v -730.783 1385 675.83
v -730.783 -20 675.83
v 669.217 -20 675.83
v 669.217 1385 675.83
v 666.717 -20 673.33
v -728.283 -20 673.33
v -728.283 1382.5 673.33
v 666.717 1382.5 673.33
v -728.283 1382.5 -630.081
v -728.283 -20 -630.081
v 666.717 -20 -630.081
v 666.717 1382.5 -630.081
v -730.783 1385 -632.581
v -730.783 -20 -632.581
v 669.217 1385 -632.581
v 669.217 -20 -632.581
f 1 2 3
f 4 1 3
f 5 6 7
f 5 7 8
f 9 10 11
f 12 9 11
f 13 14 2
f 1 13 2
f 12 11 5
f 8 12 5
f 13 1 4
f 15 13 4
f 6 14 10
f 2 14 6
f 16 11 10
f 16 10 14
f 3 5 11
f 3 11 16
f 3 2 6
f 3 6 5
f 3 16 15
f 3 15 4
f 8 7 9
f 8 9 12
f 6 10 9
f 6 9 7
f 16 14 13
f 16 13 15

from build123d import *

# Parameters (mm, degrees)
F0_W     = 1400
F0_H     = 1308.4111795891
F1_DEPTH = 20
F2_DEPTH = 1385
F3_T     = -2.5


with BuildPart() as f1:
    # F0 (on Front) → F1 (new body)
    with BuildSketch(Plane.XZ):
        with Locations((-30.7828634977, 21.6243253089)):
            Rectangle(F0_W, F0_H)
    extrude(amount=F1_DEPTH)

    # F2 (add): faces of the model
    f2_faces = [f1.faces().sort_by_distance(p)[0] for p in [
        (-30.7828634977, -20, 21.6243253089),
        (-30.7828634977, 0, 21.6243253089),
    ]]
    extrude(f2_faces, amount=-F2_DEPTH, dir=(0, -1, 0))

    # F3
    f3_openings = [f1.faces().sort_by_distance(p)[0] for p in [
        (-30.782863, -20, 21.624325),
    ]]
    offset(amount=F3_T, openings=f3_openings)


solid = f1.part
